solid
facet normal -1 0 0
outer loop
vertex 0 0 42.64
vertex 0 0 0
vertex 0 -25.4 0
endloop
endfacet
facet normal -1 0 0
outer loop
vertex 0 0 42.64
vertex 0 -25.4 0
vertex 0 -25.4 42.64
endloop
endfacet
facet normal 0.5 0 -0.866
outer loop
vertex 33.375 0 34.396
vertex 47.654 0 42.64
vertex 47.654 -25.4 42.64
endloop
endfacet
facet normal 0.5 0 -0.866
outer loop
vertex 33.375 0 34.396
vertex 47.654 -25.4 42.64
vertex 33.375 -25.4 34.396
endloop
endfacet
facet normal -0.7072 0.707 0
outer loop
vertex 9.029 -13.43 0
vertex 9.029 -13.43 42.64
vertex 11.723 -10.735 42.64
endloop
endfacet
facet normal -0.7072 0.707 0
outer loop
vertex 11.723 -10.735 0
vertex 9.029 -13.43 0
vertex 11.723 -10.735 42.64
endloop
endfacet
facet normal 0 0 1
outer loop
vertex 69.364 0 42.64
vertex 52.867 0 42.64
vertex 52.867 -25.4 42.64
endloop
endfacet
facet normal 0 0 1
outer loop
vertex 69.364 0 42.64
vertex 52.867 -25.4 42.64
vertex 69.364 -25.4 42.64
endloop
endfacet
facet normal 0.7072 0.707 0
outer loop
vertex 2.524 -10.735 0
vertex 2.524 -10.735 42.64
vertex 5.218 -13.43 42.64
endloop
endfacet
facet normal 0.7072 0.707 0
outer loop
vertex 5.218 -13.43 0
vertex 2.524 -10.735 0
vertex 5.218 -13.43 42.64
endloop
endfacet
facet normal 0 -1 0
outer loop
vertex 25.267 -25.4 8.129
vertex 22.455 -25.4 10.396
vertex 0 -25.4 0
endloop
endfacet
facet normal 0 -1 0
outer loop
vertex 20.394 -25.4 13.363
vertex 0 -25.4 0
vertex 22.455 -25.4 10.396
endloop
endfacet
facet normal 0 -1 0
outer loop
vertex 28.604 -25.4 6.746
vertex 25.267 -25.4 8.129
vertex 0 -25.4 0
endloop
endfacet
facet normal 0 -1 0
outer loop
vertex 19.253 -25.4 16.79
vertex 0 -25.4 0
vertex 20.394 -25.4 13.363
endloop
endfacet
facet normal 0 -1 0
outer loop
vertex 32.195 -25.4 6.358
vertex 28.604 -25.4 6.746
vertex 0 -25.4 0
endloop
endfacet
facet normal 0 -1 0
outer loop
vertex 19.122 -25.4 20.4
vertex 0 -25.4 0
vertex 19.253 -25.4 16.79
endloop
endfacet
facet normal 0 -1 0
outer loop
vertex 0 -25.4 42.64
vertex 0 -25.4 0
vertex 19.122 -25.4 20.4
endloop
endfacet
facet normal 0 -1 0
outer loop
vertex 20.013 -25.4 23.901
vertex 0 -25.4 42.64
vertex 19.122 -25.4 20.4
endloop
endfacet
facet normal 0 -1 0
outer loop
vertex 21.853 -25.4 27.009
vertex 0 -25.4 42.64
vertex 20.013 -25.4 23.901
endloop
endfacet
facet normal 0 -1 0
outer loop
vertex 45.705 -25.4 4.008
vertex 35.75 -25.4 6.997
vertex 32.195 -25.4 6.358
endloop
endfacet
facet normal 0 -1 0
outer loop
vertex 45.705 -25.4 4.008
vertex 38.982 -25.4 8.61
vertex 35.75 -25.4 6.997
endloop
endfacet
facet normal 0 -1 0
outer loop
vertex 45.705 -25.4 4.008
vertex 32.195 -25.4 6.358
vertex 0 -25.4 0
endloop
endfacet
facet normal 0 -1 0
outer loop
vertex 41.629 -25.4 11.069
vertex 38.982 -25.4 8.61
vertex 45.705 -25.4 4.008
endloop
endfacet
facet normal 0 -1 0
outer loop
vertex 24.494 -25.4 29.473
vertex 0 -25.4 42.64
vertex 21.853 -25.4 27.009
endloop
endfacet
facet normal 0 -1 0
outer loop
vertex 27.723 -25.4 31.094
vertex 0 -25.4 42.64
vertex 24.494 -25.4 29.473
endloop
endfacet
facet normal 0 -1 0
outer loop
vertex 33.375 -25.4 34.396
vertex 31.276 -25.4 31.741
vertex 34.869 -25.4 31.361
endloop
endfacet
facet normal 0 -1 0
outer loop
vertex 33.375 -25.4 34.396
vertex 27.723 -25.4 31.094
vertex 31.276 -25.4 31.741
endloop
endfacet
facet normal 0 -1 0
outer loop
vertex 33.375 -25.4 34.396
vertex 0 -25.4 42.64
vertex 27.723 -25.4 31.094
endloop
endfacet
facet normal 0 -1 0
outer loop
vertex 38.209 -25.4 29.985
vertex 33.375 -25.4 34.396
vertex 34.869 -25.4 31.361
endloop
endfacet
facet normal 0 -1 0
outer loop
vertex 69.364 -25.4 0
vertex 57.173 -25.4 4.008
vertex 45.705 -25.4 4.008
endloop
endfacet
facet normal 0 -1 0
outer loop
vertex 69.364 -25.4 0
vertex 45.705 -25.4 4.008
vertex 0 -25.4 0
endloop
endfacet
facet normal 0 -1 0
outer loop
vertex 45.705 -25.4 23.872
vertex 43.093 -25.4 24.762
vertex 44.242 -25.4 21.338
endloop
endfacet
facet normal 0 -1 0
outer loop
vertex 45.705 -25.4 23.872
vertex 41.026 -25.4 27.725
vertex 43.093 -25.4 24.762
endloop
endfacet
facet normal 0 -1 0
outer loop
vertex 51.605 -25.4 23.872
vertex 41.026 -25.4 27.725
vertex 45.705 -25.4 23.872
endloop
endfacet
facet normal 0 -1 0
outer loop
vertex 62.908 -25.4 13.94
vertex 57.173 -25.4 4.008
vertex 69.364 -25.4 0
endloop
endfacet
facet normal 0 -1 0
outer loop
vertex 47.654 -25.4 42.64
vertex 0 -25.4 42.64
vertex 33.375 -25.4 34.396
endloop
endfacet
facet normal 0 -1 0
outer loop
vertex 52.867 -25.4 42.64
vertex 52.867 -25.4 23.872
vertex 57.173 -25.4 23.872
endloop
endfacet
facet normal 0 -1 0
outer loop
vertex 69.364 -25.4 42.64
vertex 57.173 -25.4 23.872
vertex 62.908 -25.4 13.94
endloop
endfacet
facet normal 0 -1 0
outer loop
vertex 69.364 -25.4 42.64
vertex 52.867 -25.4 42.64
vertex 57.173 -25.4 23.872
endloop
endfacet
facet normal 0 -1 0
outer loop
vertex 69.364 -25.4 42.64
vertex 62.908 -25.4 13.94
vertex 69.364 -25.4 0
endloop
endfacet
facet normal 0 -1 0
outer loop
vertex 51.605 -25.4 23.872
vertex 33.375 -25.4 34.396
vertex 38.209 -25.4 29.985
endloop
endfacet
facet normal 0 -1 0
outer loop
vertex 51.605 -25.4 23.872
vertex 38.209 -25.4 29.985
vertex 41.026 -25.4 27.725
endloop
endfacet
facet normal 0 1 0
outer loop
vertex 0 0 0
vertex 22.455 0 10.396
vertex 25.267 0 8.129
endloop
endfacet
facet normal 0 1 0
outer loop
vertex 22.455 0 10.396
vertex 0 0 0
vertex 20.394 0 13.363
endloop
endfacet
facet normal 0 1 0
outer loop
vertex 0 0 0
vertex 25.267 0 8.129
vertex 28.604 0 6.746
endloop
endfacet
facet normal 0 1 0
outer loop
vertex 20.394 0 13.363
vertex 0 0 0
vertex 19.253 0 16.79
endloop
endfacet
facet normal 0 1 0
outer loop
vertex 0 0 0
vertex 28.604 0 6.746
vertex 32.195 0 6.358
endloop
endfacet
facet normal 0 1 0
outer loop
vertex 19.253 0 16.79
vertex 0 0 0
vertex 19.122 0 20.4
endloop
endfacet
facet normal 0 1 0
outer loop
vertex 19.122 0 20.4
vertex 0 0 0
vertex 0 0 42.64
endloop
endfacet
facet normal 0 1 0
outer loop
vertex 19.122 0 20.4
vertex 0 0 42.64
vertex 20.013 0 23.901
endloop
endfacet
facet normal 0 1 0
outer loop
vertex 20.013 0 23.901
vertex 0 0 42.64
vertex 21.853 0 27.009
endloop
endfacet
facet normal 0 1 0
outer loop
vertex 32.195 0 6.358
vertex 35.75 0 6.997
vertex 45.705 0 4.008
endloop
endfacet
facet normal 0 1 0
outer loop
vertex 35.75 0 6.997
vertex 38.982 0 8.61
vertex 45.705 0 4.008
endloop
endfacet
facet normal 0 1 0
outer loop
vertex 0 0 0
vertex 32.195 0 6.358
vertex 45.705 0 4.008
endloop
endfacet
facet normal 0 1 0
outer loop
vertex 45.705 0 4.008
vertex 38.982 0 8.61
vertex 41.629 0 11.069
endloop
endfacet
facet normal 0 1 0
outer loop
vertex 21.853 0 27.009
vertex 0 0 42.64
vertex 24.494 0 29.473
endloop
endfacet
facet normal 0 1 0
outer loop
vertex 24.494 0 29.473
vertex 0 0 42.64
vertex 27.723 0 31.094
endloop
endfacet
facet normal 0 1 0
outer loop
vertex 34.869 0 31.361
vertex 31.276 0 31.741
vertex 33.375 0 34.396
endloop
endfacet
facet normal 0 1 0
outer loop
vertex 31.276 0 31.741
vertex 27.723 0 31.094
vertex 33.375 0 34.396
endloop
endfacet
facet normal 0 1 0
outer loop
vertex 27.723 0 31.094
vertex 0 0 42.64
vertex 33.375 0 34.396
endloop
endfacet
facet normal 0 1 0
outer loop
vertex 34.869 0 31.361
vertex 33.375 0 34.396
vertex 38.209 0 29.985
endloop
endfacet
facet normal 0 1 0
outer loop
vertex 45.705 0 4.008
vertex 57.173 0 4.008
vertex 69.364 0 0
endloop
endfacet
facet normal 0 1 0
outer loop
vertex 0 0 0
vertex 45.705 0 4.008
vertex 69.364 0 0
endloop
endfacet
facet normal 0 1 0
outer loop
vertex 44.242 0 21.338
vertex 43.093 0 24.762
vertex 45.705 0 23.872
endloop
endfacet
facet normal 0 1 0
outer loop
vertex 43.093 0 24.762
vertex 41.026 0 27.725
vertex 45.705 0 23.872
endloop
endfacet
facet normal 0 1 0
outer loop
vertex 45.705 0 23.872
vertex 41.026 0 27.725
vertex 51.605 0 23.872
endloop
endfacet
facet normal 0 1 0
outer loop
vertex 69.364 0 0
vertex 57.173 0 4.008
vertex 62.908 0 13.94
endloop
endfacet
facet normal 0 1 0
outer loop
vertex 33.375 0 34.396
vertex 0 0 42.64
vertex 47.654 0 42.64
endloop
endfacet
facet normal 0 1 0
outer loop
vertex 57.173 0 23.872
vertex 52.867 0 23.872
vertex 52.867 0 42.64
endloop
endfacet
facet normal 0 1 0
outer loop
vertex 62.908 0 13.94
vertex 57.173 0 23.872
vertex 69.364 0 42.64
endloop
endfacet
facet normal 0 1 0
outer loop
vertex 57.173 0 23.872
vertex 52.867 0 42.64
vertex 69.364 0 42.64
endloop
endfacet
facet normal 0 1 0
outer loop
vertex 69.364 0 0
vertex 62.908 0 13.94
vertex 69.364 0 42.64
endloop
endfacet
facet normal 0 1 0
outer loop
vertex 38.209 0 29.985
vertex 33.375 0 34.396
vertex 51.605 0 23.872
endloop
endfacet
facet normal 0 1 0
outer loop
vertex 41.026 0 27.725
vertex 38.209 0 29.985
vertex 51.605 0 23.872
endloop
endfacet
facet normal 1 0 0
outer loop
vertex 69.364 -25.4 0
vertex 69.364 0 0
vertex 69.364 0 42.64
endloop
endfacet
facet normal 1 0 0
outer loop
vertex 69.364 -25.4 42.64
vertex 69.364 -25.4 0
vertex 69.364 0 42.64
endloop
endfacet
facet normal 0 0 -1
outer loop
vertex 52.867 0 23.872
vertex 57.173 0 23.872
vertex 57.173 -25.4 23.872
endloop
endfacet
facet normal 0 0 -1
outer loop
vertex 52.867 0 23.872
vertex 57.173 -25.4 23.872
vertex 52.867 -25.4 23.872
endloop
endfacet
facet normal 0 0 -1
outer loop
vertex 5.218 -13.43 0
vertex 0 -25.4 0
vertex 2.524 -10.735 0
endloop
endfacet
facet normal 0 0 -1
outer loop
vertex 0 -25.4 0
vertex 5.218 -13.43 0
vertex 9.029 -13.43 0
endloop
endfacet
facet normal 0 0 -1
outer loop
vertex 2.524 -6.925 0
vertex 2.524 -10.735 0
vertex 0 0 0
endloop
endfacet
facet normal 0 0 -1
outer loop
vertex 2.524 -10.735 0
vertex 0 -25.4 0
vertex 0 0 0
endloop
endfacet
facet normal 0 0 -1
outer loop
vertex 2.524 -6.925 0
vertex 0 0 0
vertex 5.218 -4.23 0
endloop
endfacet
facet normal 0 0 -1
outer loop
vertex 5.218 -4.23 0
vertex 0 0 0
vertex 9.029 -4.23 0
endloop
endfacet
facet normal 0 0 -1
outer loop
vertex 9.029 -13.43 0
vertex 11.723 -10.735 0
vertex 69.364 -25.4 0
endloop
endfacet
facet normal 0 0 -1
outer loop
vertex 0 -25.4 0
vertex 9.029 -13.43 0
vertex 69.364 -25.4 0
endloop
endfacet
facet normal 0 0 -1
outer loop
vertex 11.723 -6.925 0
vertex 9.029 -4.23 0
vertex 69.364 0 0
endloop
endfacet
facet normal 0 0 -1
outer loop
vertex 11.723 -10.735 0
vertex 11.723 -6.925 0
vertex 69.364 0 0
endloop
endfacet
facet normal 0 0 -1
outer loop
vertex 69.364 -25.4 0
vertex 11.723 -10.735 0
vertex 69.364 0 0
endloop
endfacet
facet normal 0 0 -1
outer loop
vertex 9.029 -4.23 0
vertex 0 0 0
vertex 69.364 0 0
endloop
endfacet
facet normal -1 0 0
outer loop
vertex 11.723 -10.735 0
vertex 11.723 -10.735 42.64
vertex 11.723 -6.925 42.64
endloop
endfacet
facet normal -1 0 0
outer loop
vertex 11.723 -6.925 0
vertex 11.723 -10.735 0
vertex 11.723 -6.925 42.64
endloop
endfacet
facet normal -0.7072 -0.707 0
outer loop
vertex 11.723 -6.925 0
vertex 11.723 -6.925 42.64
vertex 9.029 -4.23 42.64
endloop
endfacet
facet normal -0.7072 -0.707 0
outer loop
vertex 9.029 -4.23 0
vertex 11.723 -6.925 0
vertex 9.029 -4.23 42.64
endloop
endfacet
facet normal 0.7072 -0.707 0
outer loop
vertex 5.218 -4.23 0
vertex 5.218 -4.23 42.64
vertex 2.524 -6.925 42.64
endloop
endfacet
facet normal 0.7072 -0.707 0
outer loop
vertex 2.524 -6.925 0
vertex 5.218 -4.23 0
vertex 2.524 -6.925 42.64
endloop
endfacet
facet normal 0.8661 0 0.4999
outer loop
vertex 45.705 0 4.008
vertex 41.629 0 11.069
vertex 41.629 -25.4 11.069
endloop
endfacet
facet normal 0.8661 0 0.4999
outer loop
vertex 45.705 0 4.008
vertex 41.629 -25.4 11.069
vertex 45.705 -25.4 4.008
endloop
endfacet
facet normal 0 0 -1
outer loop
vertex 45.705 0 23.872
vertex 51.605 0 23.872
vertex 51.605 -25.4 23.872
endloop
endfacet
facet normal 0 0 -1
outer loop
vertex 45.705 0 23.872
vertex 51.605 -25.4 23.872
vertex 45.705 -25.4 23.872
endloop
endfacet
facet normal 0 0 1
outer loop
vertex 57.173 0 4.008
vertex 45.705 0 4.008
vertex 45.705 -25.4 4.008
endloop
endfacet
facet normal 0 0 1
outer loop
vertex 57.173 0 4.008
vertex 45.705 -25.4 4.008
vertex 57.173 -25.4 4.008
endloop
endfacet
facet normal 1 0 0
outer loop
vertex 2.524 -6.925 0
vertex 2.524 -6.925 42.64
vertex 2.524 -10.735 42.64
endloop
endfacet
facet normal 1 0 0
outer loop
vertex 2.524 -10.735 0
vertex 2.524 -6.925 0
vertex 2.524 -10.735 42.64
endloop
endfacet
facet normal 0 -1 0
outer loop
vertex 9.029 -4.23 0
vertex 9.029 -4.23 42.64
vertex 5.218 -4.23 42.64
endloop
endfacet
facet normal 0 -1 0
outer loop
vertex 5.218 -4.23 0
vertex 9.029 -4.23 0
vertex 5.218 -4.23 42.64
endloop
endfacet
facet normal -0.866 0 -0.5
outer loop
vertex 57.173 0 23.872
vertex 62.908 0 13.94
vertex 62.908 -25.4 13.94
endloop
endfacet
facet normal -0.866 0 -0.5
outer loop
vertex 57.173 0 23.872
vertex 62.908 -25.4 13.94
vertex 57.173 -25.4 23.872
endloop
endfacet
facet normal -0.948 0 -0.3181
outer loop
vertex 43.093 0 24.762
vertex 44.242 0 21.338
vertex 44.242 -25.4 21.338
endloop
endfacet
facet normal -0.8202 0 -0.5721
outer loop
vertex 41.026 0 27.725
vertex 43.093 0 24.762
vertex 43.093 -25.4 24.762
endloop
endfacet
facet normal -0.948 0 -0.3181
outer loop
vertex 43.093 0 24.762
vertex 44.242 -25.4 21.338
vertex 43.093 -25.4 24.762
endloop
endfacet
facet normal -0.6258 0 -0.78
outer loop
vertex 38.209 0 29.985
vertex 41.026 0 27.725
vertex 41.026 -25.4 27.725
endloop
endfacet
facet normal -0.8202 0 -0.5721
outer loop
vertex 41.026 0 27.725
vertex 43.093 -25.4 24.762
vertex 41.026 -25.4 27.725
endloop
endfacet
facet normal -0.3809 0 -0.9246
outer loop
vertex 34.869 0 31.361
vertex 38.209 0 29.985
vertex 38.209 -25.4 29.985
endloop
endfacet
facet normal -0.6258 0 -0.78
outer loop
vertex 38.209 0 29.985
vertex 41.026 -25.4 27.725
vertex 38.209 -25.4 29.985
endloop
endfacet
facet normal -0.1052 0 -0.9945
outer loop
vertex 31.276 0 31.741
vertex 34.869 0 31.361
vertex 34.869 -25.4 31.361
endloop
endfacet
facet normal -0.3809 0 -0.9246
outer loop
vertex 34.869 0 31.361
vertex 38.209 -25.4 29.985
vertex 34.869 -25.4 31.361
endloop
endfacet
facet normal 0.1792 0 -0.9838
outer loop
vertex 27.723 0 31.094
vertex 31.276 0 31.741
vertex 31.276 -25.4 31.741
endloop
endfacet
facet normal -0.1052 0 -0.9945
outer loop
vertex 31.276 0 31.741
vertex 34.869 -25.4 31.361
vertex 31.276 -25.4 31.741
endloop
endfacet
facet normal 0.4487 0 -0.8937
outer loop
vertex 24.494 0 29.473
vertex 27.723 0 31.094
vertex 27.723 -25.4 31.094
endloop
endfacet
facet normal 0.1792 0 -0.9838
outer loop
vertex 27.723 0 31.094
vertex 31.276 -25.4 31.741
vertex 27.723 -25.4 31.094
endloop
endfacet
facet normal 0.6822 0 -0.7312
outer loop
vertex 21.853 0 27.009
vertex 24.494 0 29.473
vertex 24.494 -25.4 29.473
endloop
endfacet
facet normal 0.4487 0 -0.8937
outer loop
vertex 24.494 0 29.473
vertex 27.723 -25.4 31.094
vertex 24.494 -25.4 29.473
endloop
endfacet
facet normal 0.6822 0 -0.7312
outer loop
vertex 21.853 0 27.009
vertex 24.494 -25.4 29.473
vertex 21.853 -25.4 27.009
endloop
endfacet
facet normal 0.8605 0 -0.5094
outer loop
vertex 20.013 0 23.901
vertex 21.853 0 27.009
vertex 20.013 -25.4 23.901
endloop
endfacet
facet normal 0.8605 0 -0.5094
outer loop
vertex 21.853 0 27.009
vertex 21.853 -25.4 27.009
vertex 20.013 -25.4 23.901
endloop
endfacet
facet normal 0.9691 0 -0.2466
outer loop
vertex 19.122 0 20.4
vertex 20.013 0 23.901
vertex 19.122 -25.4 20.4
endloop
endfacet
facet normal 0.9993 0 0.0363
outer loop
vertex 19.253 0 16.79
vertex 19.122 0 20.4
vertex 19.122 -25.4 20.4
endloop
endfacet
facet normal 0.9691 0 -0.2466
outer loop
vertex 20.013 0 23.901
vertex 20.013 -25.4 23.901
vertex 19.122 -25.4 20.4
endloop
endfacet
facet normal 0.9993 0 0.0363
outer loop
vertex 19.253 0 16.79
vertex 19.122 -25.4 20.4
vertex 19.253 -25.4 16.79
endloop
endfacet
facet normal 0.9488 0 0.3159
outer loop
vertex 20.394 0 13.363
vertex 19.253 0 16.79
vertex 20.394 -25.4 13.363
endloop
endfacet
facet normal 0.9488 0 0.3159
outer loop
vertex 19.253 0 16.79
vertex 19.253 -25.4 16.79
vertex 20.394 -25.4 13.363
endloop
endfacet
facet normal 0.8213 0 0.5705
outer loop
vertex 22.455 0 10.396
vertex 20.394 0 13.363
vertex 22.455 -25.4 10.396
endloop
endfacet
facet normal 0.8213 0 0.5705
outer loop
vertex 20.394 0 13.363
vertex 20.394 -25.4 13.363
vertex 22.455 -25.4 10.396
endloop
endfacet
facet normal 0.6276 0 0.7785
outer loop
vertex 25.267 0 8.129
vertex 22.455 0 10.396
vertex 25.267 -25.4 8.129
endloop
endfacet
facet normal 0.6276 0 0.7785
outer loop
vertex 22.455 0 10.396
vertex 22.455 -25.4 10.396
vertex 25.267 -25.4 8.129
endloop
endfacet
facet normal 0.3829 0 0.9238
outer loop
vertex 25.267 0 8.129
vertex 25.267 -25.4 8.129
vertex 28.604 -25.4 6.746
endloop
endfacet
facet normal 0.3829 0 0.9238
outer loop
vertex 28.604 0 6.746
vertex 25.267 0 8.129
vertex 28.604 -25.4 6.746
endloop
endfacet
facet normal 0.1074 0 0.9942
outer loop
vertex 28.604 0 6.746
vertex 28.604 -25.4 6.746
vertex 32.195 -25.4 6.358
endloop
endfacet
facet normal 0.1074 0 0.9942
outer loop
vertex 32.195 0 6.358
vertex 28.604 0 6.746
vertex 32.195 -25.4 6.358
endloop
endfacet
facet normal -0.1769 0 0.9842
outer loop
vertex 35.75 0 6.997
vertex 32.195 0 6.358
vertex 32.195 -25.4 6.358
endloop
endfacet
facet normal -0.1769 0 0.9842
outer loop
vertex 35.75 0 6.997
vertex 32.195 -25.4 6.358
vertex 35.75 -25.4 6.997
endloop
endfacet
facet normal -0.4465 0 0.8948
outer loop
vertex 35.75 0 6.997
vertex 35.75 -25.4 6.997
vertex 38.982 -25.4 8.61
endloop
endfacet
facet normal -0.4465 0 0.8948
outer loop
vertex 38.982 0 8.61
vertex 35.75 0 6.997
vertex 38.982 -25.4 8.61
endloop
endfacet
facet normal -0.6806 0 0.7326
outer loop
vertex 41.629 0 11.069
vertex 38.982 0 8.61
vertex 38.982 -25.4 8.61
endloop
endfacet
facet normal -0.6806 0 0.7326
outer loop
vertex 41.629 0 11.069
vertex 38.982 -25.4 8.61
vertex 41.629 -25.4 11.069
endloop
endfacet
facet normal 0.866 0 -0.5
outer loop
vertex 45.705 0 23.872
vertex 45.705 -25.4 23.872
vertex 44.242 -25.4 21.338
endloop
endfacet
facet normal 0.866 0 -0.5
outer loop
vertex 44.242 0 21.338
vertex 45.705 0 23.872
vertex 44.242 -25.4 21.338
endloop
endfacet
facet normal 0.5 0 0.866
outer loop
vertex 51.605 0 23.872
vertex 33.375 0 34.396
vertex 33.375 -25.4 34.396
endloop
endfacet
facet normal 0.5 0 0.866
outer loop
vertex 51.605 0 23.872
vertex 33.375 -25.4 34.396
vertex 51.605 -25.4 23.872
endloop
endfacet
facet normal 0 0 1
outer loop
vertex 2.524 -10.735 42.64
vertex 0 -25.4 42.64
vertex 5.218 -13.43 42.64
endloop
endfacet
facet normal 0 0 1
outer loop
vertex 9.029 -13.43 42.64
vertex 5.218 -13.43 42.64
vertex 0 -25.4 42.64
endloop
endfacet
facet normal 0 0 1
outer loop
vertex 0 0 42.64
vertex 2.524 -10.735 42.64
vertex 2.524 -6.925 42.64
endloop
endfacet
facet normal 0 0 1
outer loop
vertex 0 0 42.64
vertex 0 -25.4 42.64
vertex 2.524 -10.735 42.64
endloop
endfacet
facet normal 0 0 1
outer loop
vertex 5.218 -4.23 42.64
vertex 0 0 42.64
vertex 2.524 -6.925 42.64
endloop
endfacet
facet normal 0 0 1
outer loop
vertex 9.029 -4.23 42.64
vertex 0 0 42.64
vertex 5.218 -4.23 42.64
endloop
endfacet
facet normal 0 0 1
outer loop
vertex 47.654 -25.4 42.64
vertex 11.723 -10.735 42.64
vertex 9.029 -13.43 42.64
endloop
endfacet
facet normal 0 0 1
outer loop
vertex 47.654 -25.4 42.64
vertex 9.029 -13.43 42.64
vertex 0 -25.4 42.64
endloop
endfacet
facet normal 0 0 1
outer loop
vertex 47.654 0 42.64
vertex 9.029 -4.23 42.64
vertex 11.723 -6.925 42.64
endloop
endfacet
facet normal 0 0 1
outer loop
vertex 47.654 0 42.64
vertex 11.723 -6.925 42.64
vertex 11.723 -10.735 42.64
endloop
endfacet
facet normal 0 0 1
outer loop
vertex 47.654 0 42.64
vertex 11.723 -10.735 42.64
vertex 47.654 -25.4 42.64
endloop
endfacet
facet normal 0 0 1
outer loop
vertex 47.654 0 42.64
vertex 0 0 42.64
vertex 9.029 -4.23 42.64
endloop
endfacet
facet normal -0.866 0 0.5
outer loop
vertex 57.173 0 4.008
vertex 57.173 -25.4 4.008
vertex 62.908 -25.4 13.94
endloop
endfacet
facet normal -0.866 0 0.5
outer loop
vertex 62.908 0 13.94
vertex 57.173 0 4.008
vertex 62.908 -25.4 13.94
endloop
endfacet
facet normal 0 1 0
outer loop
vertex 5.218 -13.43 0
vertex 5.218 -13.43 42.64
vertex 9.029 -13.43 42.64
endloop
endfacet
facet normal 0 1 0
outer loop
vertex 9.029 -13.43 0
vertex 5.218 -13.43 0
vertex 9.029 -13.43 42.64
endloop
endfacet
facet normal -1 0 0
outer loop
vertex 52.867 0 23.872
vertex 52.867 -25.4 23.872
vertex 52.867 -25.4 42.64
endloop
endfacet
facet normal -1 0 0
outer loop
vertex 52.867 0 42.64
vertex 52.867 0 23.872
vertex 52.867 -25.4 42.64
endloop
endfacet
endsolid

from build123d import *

# Parameters (mm, degrees)
F0_W     = 69.364339
F0_H     = 42.640485
F1_DEPTH = 25.4
F2_R     = 12.7
F3_DEPTH = 25.401
F4_DEPTH = 19.05
F6_DEPTH = 25.4
F8_DEPTH = 42.641485


with BuildPart() as f1:
    # F0 (on Front) → F1 (new body)
    with BuildSketch(Plane.XZ):
        with Locations((34.68217, 21.320242)):
            Rectangle(F0_W, F0_H)
    extrude(amount=F1_DEPTH)

    # F2 (on face) → F3 (cut, through all)
    with BuildSketch(Plane.XZ.offset(25.4)):
        with Locations((31.75, 19.05)):
            Circle(F2_R)
        Polygon((52.866902, 23.142773), (52.866902, 45.649943), (33.375122, 34.396358), align=None)
    extrude(amount=-F3_DEPTH, mode=Mode.SUBTRACT)

    # F2 (on face) → F4 (cut)
    with BuildSketch(Plane.XZ.offset(25.4)):
        with Locations((31.75, 19.05)):
            Circle(F2_R)
        Polygon((52.866902, 23.142773), (52.866902, 45.649943), (33.375122, 34.396358), align=None)
    extrude(amount=-F4_DEPTH, mode=Mode.SUBTRACT)

    # F5 (on face) → F6 (cut)
    with BuildSketch(Plane.XZ.offset(25.4)):
        Polygon((45.705261, 4.008082), (57.173451, 4.008082), (62.907545, 13.939825), (57.173451, 23.871568), (45.705261, 23.871568), (39.971167, 13.939825), align=None)
    extrude(amount=-F6_DEPTH, mode=Mode.SUBTRACT)

    # F7 (on face) → F8 (cut, through all)
    with BuildSketch(Plane.XY.offset(42.640485)):
        Polygon((5.218119, -13.429749), (9.02866, -13.429749), (11.72312, -10.735289), (11.72312, -6.924748), (9.02866, -4.230288), (5.218119, -4.230288), (2.523659, -6.924748), (2.523659, -10.735289), align=None)
    extrude(amount=-F8_DEPTH, mode=Mode.SUBTRACT)


solid = f1.part
